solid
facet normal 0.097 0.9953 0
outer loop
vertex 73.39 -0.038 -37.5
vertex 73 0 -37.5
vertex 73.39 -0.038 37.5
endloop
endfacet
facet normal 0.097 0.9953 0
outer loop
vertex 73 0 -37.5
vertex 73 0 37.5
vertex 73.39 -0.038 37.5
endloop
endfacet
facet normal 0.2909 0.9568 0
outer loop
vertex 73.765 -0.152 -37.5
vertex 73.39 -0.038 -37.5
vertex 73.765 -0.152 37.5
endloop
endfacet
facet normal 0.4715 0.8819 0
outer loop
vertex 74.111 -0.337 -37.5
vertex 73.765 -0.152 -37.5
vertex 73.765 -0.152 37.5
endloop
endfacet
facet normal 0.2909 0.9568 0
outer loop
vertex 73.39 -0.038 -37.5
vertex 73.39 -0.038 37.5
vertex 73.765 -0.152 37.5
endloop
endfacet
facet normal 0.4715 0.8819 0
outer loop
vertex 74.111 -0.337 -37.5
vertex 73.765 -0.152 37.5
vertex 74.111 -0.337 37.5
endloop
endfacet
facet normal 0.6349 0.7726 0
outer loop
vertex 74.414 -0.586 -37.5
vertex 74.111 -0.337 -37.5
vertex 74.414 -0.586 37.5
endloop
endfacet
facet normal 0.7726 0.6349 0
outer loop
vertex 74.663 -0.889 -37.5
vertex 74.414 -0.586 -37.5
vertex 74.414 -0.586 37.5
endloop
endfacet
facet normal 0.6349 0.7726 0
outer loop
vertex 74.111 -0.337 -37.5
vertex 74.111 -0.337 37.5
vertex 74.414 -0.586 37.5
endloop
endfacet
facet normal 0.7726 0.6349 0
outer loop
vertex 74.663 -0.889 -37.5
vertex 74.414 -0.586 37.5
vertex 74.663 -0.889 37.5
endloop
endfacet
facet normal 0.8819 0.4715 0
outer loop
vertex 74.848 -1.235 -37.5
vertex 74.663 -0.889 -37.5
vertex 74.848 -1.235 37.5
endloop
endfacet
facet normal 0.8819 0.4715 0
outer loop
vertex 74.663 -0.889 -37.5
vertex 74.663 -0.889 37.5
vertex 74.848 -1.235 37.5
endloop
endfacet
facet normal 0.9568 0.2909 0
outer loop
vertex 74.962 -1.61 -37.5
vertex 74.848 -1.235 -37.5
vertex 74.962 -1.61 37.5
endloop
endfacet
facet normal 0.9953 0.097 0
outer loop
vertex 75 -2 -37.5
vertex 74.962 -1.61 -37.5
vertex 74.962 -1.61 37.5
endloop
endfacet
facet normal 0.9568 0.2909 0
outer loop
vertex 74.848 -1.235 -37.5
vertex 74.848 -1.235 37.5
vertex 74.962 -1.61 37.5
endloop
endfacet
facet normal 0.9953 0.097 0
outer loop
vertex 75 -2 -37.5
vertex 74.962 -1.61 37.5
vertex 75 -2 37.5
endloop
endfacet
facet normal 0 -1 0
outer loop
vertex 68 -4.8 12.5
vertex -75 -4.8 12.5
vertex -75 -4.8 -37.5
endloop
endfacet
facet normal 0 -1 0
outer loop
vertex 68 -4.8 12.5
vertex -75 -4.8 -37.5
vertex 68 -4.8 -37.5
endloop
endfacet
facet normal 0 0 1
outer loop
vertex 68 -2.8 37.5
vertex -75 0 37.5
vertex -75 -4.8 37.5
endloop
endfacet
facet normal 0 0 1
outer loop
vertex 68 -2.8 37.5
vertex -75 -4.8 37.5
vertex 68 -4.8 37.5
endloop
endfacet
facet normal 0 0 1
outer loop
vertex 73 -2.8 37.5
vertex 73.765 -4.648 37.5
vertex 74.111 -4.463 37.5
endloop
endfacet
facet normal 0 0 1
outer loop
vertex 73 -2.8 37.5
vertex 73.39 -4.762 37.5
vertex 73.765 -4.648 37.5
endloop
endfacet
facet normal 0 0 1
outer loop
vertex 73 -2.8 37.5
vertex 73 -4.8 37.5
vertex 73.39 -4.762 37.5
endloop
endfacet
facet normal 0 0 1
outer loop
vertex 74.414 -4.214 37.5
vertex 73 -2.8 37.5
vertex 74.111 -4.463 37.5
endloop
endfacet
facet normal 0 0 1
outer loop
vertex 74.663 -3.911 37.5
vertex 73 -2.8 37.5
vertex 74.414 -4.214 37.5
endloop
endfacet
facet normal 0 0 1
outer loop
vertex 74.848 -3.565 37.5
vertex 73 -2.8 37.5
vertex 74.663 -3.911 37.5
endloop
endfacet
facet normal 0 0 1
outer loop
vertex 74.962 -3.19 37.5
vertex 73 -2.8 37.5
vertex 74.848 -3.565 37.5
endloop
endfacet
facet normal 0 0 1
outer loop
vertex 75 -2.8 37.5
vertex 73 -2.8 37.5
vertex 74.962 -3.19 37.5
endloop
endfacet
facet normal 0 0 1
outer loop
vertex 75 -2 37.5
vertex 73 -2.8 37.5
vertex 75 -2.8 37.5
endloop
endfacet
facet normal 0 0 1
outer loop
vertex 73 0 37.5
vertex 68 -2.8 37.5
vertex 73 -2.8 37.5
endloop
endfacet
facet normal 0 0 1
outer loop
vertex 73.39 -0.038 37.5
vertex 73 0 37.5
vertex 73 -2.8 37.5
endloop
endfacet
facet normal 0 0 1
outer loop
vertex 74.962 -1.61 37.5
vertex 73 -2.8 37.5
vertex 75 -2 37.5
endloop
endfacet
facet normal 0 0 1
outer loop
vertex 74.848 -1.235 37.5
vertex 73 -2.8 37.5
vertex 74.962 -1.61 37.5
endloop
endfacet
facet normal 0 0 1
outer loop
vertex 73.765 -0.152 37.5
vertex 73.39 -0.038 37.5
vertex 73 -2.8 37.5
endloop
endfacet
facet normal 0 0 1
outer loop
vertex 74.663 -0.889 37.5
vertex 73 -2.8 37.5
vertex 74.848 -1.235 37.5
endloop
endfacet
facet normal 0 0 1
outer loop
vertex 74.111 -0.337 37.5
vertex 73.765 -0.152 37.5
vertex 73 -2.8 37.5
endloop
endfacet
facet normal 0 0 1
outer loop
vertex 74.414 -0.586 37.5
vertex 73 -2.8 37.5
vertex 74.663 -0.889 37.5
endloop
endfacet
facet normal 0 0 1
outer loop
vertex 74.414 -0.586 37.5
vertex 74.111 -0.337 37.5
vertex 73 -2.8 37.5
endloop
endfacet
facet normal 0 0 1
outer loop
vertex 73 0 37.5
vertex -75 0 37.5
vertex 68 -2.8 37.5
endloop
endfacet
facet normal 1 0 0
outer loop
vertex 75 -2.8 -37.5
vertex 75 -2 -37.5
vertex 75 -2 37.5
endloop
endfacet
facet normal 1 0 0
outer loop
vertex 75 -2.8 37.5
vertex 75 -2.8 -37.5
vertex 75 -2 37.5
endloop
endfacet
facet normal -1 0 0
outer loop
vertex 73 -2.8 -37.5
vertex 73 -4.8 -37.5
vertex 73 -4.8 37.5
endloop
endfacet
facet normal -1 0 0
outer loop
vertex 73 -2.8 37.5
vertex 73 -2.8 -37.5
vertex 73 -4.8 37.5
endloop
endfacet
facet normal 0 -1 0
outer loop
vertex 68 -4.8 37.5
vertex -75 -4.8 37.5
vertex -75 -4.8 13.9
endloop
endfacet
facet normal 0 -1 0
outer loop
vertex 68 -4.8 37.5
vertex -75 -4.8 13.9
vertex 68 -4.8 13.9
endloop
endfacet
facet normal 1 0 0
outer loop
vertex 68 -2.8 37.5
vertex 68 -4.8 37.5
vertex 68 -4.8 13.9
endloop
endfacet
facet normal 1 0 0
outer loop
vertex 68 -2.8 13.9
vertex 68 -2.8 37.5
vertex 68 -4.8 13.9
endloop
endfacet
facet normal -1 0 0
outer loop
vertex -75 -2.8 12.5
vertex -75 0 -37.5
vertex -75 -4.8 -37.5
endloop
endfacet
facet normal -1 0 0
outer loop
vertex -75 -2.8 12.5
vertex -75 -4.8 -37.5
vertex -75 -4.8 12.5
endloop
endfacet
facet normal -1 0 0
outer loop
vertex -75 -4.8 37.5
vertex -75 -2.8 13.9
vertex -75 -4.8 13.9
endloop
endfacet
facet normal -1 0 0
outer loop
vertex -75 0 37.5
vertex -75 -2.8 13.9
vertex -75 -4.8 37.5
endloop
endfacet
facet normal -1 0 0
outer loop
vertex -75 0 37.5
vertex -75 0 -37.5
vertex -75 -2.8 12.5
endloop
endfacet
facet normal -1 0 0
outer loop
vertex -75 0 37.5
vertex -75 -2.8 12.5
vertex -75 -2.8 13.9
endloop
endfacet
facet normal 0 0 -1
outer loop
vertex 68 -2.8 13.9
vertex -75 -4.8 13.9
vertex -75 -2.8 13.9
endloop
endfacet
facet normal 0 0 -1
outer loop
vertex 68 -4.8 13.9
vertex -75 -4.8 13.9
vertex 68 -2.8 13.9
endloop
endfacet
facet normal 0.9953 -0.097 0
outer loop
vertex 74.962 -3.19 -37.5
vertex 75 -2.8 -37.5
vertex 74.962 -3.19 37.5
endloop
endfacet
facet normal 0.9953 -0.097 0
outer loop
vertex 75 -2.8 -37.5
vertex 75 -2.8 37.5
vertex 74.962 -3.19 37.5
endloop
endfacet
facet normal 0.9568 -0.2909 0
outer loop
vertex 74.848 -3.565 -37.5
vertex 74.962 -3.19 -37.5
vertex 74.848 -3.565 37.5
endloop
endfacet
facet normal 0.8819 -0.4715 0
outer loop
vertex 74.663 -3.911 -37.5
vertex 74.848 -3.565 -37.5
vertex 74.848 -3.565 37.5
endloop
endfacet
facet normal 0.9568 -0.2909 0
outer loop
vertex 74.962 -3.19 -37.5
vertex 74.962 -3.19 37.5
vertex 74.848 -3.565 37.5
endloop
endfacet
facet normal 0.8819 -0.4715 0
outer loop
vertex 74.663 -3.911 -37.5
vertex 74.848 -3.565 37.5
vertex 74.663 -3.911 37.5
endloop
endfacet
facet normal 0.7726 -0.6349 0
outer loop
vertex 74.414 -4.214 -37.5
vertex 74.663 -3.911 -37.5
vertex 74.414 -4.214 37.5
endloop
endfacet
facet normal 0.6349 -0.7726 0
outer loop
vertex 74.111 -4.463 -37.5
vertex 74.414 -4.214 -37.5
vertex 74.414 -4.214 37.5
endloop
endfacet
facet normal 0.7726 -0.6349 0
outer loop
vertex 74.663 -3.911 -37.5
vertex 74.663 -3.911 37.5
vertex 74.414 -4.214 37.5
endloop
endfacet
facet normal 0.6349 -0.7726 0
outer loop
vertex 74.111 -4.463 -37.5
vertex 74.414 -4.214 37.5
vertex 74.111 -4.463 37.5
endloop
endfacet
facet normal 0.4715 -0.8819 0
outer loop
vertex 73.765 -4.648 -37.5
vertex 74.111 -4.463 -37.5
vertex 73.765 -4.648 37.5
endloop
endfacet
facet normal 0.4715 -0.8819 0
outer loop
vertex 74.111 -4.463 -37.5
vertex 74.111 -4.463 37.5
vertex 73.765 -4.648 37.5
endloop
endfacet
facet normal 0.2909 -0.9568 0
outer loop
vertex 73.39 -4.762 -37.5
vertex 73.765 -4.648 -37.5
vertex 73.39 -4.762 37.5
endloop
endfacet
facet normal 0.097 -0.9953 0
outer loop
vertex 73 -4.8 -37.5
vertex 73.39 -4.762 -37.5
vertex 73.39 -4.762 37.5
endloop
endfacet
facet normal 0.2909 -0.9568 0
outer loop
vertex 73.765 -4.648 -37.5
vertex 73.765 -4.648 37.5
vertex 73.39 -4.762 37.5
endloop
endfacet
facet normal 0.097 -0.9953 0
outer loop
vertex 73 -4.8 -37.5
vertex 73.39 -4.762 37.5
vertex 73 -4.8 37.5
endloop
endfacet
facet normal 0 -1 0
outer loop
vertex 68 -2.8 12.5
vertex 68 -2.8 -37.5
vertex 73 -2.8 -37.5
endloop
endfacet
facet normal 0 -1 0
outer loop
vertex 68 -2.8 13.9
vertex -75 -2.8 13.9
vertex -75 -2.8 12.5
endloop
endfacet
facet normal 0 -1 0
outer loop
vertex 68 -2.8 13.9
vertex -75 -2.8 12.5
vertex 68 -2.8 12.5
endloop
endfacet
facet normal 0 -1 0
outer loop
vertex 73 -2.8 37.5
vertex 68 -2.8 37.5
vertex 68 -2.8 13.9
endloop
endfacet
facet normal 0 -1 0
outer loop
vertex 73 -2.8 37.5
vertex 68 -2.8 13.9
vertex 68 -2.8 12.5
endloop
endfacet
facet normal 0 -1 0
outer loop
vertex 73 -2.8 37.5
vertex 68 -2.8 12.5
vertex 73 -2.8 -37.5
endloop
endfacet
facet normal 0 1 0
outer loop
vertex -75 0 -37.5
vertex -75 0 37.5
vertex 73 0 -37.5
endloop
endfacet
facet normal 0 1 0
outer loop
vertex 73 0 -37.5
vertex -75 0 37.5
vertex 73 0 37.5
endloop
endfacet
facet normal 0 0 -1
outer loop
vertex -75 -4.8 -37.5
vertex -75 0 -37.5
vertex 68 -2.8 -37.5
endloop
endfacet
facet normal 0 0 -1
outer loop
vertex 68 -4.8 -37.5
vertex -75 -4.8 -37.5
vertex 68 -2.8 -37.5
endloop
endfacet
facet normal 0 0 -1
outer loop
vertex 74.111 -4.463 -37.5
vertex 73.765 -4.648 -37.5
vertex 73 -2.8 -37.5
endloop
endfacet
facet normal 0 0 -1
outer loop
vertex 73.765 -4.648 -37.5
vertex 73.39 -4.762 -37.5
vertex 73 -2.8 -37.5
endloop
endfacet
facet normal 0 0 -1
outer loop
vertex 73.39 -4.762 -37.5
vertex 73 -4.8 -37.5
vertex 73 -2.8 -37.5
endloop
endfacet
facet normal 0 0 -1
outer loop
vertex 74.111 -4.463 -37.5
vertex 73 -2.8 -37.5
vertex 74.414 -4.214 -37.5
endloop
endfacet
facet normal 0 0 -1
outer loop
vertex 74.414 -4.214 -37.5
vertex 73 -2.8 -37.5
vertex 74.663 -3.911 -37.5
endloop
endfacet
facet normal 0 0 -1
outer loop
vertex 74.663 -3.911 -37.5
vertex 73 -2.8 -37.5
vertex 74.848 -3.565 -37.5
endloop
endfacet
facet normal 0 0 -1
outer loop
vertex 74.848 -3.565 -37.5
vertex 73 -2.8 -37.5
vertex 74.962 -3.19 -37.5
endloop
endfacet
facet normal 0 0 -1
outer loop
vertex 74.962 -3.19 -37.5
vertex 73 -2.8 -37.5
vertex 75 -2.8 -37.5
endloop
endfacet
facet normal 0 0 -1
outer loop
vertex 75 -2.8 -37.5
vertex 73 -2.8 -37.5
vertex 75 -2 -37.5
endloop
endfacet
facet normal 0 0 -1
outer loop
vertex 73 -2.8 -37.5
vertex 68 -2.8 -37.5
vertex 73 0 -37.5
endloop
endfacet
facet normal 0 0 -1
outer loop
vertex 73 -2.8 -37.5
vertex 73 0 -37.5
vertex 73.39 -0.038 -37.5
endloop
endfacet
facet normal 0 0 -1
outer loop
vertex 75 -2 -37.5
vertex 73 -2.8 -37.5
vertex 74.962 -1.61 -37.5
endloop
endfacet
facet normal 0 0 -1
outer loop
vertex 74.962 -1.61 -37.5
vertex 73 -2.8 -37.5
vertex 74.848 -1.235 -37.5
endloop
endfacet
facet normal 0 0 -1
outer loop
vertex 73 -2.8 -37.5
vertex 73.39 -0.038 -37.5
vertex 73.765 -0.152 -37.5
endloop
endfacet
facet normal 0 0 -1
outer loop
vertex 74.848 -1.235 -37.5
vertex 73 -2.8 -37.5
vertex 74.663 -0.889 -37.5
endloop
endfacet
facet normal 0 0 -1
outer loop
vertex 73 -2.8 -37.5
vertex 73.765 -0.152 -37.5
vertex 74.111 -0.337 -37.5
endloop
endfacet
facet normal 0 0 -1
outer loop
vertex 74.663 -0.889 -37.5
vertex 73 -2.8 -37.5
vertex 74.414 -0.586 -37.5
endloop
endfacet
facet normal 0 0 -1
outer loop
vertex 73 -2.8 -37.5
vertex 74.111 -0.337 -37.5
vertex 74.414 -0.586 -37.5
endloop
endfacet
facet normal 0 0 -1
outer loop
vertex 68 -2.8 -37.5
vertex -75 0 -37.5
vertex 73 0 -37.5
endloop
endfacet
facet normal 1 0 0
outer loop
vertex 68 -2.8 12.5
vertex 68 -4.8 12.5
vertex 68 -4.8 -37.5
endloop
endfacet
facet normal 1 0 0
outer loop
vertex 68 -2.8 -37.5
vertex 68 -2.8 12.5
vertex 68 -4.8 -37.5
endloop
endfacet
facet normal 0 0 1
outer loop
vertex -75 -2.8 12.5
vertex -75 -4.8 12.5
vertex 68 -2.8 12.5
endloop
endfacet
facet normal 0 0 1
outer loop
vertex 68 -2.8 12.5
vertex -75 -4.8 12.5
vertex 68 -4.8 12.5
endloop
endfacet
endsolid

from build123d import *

# Parameters (mm, degrees)
F0_W     = 150
F0_H     = 75
F1_DEPTH = 4.8
F2_W     = 143
F2_H     = 1.4
F3_DEPTH = 2
F4_R     = 1.99999


# Not quite as in the source:
# - a fillet or chamfer is up to 0.001 mm smaller than in the source, because OpenCascade refuses the exact size


with BuildPart() as f1:
    # F0 (on Front) → F1 (new body)
    with BuildSketch(Plane.XZ):
        Rectangle(F0_W, F0_H)
    extrude(amount=F1_DEPTH)

    # F2 (on face) → F3 (cut)
    with BuildSketch(Plane.XZ.offset(4.8)):
        Polygon((68, 12.5), (68, -37.5), (73, -37.5), (73, 37.5), (68, 37.5), (68, 13.9), align=None)
        with Locations((-3.5, 13.2)):
            Rectangle(F2_W, F2_H)
    extrude(amount=-F3_DEPTH, mode=Mode.SUBTRACT)

    # F4 (radius 2 in the source; OpenCascade refuses exactly that, so slightly less here)
    f4_edges = [f1.edges().sort_by_distance(p)[0] for p in [
        (75, 0, 0),
        (75, -4.8, 0),
    ]]
    fillet(f4_edges, radius=F4_R)


solid = f1.part
